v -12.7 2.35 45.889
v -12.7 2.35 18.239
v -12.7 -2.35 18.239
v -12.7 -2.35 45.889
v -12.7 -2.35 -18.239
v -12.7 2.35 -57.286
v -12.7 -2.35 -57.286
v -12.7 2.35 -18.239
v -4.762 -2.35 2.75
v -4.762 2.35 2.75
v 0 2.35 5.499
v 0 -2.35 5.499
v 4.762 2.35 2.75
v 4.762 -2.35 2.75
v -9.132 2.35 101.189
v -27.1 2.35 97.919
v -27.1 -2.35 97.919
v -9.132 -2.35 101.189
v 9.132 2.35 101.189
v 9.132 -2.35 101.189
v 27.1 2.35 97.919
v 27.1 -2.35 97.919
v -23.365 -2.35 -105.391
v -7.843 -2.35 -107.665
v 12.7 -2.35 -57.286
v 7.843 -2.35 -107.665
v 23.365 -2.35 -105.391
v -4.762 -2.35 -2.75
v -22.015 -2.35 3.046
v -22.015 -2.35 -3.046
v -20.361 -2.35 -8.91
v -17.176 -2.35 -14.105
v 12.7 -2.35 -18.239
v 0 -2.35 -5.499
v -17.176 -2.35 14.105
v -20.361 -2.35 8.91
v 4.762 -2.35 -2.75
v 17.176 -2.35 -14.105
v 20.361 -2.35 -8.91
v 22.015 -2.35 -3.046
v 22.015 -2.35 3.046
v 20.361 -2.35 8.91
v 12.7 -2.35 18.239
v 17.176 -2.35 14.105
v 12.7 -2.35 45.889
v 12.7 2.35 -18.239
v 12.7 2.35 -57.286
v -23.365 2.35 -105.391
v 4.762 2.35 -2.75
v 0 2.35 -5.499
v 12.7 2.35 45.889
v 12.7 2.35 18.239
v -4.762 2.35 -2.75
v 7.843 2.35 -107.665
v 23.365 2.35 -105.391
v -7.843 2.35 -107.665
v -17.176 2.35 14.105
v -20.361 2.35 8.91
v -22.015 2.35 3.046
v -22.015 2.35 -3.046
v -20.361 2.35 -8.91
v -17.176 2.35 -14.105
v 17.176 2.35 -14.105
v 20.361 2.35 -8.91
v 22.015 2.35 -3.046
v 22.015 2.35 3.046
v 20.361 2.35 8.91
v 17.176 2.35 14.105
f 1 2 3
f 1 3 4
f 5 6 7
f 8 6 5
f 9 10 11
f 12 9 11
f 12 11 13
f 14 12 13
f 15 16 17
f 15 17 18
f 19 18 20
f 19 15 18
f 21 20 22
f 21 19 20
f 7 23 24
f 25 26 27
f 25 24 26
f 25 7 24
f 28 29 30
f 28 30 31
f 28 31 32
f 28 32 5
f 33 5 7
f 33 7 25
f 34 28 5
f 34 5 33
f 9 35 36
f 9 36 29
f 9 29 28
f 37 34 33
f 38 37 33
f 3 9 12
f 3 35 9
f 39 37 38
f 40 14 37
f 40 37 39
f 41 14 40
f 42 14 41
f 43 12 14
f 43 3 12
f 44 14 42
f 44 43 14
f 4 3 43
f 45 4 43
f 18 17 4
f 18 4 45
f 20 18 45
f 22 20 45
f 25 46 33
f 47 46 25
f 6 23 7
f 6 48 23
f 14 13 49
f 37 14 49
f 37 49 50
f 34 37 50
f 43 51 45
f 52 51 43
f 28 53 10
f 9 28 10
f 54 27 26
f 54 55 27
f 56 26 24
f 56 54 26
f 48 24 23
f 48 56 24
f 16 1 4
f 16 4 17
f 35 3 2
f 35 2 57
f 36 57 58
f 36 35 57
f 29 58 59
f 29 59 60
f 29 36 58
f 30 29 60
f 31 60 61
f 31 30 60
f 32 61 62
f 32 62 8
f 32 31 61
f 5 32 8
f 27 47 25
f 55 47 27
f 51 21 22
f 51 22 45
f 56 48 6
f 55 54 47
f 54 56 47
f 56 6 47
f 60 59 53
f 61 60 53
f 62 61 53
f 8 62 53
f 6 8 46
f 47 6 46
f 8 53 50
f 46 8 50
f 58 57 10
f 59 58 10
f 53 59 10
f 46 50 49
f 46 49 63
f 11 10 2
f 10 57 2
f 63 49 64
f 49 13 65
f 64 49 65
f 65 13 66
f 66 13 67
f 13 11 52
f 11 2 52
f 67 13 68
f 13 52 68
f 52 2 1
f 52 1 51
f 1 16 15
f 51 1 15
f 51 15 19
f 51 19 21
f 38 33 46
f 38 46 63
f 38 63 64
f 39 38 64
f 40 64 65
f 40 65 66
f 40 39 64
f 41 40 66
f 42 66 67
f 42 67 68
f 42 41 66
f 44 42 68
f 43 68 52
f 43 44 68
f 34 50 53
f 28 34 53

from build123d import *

# Parameters (mm, degrees)
BOSS_EXTRUDE1_DEPTH = 2.3495
CUT_EXTRUDE1_REACH  = 113.399
SKETCH3_R           = 22.225
BOSS_EXTRUDE2_DEPTH = 4.699


with BuildPart() as part:
    # Sketch1 → Boss-Extrude1 (new, symmetric)
    with BuildSketch(Plane(origin=(0, 0, 0), x_dir=(1, 0, 0), z_dir=(0, 1, 0))):
        with BuildLine():
            Line((-12.7, 57.285997997), (-12.7, -45.888631599))
            Line((-12.7, -45.888631599), (-27.099810626, -97.919151671))
            ThreePointArc((-27.099810626, -97.919151671), (0, -101.6), (27.099810626, -97.919151671))
            Line((27.099810626, -97.919151671), (12.7, -45.888631599))
            Line((12.7, -45.888631599), (12.7, 57.285997997))
            Line((12.7, 57.285997997), (23.364656325, 105.391153969))
            ThreePointArc((23.364656325, 105.391153969), (0, 107.95), (-23.364656325, 105.391153969))
            Line((-23.364656325, 105.391153969), (-12.7, 57.285997997))
        make_face()
    extrude(amount=BOSS_EXTRUDE1_DEPTH, both=True)

    # Sketch2 → Cut-Extrude1 (cut, up to next)
    with BuildSketch(Plane(origin=(0, 2.3495, 0), x_dir=(1, 0, 0), z_dir=(0, 1, 0)), mode=Mode.PRIVATE) as cut_extrude1_sk1:
        Polygon((4.7625, -2.749630657), (4.7625, 2.749630657), (0, 5.499261314), (-4.7625, 2.749630657), (-4.7625, -2.749630657), (0, -5.499261314), align=None)
    cut_extrude1_tool1 = extrude(cut_extrude1_sk1.sketch, amount=-CUT_EXTRUDE1_REACH, mode=Mode.PRIVATE) & part.part
    add(cut_extrude1_tool1.solids().sort_by_distance((0, 2.3495, 0))[0], mode=Mode.SUBTRACT)

    # Sketch3 → Boss-Extrude2 (add)
    with BuildSketch(Plane.XZ.offset(2.3495)):
        Circle(SKETCH3_R)
        Polygon((4.7625, -2.749630657), (0, -5.499261314), (-4.7625, -2.749630657), (-4.7625, 2.749630657), (0, 5.499261314), (4.7625, 2.749630657), align=None, mode=Mode.SUBTRACT)
    extrude(amount=-BOSS_EXTRUDE2_DEPTH)


solid = part.part
